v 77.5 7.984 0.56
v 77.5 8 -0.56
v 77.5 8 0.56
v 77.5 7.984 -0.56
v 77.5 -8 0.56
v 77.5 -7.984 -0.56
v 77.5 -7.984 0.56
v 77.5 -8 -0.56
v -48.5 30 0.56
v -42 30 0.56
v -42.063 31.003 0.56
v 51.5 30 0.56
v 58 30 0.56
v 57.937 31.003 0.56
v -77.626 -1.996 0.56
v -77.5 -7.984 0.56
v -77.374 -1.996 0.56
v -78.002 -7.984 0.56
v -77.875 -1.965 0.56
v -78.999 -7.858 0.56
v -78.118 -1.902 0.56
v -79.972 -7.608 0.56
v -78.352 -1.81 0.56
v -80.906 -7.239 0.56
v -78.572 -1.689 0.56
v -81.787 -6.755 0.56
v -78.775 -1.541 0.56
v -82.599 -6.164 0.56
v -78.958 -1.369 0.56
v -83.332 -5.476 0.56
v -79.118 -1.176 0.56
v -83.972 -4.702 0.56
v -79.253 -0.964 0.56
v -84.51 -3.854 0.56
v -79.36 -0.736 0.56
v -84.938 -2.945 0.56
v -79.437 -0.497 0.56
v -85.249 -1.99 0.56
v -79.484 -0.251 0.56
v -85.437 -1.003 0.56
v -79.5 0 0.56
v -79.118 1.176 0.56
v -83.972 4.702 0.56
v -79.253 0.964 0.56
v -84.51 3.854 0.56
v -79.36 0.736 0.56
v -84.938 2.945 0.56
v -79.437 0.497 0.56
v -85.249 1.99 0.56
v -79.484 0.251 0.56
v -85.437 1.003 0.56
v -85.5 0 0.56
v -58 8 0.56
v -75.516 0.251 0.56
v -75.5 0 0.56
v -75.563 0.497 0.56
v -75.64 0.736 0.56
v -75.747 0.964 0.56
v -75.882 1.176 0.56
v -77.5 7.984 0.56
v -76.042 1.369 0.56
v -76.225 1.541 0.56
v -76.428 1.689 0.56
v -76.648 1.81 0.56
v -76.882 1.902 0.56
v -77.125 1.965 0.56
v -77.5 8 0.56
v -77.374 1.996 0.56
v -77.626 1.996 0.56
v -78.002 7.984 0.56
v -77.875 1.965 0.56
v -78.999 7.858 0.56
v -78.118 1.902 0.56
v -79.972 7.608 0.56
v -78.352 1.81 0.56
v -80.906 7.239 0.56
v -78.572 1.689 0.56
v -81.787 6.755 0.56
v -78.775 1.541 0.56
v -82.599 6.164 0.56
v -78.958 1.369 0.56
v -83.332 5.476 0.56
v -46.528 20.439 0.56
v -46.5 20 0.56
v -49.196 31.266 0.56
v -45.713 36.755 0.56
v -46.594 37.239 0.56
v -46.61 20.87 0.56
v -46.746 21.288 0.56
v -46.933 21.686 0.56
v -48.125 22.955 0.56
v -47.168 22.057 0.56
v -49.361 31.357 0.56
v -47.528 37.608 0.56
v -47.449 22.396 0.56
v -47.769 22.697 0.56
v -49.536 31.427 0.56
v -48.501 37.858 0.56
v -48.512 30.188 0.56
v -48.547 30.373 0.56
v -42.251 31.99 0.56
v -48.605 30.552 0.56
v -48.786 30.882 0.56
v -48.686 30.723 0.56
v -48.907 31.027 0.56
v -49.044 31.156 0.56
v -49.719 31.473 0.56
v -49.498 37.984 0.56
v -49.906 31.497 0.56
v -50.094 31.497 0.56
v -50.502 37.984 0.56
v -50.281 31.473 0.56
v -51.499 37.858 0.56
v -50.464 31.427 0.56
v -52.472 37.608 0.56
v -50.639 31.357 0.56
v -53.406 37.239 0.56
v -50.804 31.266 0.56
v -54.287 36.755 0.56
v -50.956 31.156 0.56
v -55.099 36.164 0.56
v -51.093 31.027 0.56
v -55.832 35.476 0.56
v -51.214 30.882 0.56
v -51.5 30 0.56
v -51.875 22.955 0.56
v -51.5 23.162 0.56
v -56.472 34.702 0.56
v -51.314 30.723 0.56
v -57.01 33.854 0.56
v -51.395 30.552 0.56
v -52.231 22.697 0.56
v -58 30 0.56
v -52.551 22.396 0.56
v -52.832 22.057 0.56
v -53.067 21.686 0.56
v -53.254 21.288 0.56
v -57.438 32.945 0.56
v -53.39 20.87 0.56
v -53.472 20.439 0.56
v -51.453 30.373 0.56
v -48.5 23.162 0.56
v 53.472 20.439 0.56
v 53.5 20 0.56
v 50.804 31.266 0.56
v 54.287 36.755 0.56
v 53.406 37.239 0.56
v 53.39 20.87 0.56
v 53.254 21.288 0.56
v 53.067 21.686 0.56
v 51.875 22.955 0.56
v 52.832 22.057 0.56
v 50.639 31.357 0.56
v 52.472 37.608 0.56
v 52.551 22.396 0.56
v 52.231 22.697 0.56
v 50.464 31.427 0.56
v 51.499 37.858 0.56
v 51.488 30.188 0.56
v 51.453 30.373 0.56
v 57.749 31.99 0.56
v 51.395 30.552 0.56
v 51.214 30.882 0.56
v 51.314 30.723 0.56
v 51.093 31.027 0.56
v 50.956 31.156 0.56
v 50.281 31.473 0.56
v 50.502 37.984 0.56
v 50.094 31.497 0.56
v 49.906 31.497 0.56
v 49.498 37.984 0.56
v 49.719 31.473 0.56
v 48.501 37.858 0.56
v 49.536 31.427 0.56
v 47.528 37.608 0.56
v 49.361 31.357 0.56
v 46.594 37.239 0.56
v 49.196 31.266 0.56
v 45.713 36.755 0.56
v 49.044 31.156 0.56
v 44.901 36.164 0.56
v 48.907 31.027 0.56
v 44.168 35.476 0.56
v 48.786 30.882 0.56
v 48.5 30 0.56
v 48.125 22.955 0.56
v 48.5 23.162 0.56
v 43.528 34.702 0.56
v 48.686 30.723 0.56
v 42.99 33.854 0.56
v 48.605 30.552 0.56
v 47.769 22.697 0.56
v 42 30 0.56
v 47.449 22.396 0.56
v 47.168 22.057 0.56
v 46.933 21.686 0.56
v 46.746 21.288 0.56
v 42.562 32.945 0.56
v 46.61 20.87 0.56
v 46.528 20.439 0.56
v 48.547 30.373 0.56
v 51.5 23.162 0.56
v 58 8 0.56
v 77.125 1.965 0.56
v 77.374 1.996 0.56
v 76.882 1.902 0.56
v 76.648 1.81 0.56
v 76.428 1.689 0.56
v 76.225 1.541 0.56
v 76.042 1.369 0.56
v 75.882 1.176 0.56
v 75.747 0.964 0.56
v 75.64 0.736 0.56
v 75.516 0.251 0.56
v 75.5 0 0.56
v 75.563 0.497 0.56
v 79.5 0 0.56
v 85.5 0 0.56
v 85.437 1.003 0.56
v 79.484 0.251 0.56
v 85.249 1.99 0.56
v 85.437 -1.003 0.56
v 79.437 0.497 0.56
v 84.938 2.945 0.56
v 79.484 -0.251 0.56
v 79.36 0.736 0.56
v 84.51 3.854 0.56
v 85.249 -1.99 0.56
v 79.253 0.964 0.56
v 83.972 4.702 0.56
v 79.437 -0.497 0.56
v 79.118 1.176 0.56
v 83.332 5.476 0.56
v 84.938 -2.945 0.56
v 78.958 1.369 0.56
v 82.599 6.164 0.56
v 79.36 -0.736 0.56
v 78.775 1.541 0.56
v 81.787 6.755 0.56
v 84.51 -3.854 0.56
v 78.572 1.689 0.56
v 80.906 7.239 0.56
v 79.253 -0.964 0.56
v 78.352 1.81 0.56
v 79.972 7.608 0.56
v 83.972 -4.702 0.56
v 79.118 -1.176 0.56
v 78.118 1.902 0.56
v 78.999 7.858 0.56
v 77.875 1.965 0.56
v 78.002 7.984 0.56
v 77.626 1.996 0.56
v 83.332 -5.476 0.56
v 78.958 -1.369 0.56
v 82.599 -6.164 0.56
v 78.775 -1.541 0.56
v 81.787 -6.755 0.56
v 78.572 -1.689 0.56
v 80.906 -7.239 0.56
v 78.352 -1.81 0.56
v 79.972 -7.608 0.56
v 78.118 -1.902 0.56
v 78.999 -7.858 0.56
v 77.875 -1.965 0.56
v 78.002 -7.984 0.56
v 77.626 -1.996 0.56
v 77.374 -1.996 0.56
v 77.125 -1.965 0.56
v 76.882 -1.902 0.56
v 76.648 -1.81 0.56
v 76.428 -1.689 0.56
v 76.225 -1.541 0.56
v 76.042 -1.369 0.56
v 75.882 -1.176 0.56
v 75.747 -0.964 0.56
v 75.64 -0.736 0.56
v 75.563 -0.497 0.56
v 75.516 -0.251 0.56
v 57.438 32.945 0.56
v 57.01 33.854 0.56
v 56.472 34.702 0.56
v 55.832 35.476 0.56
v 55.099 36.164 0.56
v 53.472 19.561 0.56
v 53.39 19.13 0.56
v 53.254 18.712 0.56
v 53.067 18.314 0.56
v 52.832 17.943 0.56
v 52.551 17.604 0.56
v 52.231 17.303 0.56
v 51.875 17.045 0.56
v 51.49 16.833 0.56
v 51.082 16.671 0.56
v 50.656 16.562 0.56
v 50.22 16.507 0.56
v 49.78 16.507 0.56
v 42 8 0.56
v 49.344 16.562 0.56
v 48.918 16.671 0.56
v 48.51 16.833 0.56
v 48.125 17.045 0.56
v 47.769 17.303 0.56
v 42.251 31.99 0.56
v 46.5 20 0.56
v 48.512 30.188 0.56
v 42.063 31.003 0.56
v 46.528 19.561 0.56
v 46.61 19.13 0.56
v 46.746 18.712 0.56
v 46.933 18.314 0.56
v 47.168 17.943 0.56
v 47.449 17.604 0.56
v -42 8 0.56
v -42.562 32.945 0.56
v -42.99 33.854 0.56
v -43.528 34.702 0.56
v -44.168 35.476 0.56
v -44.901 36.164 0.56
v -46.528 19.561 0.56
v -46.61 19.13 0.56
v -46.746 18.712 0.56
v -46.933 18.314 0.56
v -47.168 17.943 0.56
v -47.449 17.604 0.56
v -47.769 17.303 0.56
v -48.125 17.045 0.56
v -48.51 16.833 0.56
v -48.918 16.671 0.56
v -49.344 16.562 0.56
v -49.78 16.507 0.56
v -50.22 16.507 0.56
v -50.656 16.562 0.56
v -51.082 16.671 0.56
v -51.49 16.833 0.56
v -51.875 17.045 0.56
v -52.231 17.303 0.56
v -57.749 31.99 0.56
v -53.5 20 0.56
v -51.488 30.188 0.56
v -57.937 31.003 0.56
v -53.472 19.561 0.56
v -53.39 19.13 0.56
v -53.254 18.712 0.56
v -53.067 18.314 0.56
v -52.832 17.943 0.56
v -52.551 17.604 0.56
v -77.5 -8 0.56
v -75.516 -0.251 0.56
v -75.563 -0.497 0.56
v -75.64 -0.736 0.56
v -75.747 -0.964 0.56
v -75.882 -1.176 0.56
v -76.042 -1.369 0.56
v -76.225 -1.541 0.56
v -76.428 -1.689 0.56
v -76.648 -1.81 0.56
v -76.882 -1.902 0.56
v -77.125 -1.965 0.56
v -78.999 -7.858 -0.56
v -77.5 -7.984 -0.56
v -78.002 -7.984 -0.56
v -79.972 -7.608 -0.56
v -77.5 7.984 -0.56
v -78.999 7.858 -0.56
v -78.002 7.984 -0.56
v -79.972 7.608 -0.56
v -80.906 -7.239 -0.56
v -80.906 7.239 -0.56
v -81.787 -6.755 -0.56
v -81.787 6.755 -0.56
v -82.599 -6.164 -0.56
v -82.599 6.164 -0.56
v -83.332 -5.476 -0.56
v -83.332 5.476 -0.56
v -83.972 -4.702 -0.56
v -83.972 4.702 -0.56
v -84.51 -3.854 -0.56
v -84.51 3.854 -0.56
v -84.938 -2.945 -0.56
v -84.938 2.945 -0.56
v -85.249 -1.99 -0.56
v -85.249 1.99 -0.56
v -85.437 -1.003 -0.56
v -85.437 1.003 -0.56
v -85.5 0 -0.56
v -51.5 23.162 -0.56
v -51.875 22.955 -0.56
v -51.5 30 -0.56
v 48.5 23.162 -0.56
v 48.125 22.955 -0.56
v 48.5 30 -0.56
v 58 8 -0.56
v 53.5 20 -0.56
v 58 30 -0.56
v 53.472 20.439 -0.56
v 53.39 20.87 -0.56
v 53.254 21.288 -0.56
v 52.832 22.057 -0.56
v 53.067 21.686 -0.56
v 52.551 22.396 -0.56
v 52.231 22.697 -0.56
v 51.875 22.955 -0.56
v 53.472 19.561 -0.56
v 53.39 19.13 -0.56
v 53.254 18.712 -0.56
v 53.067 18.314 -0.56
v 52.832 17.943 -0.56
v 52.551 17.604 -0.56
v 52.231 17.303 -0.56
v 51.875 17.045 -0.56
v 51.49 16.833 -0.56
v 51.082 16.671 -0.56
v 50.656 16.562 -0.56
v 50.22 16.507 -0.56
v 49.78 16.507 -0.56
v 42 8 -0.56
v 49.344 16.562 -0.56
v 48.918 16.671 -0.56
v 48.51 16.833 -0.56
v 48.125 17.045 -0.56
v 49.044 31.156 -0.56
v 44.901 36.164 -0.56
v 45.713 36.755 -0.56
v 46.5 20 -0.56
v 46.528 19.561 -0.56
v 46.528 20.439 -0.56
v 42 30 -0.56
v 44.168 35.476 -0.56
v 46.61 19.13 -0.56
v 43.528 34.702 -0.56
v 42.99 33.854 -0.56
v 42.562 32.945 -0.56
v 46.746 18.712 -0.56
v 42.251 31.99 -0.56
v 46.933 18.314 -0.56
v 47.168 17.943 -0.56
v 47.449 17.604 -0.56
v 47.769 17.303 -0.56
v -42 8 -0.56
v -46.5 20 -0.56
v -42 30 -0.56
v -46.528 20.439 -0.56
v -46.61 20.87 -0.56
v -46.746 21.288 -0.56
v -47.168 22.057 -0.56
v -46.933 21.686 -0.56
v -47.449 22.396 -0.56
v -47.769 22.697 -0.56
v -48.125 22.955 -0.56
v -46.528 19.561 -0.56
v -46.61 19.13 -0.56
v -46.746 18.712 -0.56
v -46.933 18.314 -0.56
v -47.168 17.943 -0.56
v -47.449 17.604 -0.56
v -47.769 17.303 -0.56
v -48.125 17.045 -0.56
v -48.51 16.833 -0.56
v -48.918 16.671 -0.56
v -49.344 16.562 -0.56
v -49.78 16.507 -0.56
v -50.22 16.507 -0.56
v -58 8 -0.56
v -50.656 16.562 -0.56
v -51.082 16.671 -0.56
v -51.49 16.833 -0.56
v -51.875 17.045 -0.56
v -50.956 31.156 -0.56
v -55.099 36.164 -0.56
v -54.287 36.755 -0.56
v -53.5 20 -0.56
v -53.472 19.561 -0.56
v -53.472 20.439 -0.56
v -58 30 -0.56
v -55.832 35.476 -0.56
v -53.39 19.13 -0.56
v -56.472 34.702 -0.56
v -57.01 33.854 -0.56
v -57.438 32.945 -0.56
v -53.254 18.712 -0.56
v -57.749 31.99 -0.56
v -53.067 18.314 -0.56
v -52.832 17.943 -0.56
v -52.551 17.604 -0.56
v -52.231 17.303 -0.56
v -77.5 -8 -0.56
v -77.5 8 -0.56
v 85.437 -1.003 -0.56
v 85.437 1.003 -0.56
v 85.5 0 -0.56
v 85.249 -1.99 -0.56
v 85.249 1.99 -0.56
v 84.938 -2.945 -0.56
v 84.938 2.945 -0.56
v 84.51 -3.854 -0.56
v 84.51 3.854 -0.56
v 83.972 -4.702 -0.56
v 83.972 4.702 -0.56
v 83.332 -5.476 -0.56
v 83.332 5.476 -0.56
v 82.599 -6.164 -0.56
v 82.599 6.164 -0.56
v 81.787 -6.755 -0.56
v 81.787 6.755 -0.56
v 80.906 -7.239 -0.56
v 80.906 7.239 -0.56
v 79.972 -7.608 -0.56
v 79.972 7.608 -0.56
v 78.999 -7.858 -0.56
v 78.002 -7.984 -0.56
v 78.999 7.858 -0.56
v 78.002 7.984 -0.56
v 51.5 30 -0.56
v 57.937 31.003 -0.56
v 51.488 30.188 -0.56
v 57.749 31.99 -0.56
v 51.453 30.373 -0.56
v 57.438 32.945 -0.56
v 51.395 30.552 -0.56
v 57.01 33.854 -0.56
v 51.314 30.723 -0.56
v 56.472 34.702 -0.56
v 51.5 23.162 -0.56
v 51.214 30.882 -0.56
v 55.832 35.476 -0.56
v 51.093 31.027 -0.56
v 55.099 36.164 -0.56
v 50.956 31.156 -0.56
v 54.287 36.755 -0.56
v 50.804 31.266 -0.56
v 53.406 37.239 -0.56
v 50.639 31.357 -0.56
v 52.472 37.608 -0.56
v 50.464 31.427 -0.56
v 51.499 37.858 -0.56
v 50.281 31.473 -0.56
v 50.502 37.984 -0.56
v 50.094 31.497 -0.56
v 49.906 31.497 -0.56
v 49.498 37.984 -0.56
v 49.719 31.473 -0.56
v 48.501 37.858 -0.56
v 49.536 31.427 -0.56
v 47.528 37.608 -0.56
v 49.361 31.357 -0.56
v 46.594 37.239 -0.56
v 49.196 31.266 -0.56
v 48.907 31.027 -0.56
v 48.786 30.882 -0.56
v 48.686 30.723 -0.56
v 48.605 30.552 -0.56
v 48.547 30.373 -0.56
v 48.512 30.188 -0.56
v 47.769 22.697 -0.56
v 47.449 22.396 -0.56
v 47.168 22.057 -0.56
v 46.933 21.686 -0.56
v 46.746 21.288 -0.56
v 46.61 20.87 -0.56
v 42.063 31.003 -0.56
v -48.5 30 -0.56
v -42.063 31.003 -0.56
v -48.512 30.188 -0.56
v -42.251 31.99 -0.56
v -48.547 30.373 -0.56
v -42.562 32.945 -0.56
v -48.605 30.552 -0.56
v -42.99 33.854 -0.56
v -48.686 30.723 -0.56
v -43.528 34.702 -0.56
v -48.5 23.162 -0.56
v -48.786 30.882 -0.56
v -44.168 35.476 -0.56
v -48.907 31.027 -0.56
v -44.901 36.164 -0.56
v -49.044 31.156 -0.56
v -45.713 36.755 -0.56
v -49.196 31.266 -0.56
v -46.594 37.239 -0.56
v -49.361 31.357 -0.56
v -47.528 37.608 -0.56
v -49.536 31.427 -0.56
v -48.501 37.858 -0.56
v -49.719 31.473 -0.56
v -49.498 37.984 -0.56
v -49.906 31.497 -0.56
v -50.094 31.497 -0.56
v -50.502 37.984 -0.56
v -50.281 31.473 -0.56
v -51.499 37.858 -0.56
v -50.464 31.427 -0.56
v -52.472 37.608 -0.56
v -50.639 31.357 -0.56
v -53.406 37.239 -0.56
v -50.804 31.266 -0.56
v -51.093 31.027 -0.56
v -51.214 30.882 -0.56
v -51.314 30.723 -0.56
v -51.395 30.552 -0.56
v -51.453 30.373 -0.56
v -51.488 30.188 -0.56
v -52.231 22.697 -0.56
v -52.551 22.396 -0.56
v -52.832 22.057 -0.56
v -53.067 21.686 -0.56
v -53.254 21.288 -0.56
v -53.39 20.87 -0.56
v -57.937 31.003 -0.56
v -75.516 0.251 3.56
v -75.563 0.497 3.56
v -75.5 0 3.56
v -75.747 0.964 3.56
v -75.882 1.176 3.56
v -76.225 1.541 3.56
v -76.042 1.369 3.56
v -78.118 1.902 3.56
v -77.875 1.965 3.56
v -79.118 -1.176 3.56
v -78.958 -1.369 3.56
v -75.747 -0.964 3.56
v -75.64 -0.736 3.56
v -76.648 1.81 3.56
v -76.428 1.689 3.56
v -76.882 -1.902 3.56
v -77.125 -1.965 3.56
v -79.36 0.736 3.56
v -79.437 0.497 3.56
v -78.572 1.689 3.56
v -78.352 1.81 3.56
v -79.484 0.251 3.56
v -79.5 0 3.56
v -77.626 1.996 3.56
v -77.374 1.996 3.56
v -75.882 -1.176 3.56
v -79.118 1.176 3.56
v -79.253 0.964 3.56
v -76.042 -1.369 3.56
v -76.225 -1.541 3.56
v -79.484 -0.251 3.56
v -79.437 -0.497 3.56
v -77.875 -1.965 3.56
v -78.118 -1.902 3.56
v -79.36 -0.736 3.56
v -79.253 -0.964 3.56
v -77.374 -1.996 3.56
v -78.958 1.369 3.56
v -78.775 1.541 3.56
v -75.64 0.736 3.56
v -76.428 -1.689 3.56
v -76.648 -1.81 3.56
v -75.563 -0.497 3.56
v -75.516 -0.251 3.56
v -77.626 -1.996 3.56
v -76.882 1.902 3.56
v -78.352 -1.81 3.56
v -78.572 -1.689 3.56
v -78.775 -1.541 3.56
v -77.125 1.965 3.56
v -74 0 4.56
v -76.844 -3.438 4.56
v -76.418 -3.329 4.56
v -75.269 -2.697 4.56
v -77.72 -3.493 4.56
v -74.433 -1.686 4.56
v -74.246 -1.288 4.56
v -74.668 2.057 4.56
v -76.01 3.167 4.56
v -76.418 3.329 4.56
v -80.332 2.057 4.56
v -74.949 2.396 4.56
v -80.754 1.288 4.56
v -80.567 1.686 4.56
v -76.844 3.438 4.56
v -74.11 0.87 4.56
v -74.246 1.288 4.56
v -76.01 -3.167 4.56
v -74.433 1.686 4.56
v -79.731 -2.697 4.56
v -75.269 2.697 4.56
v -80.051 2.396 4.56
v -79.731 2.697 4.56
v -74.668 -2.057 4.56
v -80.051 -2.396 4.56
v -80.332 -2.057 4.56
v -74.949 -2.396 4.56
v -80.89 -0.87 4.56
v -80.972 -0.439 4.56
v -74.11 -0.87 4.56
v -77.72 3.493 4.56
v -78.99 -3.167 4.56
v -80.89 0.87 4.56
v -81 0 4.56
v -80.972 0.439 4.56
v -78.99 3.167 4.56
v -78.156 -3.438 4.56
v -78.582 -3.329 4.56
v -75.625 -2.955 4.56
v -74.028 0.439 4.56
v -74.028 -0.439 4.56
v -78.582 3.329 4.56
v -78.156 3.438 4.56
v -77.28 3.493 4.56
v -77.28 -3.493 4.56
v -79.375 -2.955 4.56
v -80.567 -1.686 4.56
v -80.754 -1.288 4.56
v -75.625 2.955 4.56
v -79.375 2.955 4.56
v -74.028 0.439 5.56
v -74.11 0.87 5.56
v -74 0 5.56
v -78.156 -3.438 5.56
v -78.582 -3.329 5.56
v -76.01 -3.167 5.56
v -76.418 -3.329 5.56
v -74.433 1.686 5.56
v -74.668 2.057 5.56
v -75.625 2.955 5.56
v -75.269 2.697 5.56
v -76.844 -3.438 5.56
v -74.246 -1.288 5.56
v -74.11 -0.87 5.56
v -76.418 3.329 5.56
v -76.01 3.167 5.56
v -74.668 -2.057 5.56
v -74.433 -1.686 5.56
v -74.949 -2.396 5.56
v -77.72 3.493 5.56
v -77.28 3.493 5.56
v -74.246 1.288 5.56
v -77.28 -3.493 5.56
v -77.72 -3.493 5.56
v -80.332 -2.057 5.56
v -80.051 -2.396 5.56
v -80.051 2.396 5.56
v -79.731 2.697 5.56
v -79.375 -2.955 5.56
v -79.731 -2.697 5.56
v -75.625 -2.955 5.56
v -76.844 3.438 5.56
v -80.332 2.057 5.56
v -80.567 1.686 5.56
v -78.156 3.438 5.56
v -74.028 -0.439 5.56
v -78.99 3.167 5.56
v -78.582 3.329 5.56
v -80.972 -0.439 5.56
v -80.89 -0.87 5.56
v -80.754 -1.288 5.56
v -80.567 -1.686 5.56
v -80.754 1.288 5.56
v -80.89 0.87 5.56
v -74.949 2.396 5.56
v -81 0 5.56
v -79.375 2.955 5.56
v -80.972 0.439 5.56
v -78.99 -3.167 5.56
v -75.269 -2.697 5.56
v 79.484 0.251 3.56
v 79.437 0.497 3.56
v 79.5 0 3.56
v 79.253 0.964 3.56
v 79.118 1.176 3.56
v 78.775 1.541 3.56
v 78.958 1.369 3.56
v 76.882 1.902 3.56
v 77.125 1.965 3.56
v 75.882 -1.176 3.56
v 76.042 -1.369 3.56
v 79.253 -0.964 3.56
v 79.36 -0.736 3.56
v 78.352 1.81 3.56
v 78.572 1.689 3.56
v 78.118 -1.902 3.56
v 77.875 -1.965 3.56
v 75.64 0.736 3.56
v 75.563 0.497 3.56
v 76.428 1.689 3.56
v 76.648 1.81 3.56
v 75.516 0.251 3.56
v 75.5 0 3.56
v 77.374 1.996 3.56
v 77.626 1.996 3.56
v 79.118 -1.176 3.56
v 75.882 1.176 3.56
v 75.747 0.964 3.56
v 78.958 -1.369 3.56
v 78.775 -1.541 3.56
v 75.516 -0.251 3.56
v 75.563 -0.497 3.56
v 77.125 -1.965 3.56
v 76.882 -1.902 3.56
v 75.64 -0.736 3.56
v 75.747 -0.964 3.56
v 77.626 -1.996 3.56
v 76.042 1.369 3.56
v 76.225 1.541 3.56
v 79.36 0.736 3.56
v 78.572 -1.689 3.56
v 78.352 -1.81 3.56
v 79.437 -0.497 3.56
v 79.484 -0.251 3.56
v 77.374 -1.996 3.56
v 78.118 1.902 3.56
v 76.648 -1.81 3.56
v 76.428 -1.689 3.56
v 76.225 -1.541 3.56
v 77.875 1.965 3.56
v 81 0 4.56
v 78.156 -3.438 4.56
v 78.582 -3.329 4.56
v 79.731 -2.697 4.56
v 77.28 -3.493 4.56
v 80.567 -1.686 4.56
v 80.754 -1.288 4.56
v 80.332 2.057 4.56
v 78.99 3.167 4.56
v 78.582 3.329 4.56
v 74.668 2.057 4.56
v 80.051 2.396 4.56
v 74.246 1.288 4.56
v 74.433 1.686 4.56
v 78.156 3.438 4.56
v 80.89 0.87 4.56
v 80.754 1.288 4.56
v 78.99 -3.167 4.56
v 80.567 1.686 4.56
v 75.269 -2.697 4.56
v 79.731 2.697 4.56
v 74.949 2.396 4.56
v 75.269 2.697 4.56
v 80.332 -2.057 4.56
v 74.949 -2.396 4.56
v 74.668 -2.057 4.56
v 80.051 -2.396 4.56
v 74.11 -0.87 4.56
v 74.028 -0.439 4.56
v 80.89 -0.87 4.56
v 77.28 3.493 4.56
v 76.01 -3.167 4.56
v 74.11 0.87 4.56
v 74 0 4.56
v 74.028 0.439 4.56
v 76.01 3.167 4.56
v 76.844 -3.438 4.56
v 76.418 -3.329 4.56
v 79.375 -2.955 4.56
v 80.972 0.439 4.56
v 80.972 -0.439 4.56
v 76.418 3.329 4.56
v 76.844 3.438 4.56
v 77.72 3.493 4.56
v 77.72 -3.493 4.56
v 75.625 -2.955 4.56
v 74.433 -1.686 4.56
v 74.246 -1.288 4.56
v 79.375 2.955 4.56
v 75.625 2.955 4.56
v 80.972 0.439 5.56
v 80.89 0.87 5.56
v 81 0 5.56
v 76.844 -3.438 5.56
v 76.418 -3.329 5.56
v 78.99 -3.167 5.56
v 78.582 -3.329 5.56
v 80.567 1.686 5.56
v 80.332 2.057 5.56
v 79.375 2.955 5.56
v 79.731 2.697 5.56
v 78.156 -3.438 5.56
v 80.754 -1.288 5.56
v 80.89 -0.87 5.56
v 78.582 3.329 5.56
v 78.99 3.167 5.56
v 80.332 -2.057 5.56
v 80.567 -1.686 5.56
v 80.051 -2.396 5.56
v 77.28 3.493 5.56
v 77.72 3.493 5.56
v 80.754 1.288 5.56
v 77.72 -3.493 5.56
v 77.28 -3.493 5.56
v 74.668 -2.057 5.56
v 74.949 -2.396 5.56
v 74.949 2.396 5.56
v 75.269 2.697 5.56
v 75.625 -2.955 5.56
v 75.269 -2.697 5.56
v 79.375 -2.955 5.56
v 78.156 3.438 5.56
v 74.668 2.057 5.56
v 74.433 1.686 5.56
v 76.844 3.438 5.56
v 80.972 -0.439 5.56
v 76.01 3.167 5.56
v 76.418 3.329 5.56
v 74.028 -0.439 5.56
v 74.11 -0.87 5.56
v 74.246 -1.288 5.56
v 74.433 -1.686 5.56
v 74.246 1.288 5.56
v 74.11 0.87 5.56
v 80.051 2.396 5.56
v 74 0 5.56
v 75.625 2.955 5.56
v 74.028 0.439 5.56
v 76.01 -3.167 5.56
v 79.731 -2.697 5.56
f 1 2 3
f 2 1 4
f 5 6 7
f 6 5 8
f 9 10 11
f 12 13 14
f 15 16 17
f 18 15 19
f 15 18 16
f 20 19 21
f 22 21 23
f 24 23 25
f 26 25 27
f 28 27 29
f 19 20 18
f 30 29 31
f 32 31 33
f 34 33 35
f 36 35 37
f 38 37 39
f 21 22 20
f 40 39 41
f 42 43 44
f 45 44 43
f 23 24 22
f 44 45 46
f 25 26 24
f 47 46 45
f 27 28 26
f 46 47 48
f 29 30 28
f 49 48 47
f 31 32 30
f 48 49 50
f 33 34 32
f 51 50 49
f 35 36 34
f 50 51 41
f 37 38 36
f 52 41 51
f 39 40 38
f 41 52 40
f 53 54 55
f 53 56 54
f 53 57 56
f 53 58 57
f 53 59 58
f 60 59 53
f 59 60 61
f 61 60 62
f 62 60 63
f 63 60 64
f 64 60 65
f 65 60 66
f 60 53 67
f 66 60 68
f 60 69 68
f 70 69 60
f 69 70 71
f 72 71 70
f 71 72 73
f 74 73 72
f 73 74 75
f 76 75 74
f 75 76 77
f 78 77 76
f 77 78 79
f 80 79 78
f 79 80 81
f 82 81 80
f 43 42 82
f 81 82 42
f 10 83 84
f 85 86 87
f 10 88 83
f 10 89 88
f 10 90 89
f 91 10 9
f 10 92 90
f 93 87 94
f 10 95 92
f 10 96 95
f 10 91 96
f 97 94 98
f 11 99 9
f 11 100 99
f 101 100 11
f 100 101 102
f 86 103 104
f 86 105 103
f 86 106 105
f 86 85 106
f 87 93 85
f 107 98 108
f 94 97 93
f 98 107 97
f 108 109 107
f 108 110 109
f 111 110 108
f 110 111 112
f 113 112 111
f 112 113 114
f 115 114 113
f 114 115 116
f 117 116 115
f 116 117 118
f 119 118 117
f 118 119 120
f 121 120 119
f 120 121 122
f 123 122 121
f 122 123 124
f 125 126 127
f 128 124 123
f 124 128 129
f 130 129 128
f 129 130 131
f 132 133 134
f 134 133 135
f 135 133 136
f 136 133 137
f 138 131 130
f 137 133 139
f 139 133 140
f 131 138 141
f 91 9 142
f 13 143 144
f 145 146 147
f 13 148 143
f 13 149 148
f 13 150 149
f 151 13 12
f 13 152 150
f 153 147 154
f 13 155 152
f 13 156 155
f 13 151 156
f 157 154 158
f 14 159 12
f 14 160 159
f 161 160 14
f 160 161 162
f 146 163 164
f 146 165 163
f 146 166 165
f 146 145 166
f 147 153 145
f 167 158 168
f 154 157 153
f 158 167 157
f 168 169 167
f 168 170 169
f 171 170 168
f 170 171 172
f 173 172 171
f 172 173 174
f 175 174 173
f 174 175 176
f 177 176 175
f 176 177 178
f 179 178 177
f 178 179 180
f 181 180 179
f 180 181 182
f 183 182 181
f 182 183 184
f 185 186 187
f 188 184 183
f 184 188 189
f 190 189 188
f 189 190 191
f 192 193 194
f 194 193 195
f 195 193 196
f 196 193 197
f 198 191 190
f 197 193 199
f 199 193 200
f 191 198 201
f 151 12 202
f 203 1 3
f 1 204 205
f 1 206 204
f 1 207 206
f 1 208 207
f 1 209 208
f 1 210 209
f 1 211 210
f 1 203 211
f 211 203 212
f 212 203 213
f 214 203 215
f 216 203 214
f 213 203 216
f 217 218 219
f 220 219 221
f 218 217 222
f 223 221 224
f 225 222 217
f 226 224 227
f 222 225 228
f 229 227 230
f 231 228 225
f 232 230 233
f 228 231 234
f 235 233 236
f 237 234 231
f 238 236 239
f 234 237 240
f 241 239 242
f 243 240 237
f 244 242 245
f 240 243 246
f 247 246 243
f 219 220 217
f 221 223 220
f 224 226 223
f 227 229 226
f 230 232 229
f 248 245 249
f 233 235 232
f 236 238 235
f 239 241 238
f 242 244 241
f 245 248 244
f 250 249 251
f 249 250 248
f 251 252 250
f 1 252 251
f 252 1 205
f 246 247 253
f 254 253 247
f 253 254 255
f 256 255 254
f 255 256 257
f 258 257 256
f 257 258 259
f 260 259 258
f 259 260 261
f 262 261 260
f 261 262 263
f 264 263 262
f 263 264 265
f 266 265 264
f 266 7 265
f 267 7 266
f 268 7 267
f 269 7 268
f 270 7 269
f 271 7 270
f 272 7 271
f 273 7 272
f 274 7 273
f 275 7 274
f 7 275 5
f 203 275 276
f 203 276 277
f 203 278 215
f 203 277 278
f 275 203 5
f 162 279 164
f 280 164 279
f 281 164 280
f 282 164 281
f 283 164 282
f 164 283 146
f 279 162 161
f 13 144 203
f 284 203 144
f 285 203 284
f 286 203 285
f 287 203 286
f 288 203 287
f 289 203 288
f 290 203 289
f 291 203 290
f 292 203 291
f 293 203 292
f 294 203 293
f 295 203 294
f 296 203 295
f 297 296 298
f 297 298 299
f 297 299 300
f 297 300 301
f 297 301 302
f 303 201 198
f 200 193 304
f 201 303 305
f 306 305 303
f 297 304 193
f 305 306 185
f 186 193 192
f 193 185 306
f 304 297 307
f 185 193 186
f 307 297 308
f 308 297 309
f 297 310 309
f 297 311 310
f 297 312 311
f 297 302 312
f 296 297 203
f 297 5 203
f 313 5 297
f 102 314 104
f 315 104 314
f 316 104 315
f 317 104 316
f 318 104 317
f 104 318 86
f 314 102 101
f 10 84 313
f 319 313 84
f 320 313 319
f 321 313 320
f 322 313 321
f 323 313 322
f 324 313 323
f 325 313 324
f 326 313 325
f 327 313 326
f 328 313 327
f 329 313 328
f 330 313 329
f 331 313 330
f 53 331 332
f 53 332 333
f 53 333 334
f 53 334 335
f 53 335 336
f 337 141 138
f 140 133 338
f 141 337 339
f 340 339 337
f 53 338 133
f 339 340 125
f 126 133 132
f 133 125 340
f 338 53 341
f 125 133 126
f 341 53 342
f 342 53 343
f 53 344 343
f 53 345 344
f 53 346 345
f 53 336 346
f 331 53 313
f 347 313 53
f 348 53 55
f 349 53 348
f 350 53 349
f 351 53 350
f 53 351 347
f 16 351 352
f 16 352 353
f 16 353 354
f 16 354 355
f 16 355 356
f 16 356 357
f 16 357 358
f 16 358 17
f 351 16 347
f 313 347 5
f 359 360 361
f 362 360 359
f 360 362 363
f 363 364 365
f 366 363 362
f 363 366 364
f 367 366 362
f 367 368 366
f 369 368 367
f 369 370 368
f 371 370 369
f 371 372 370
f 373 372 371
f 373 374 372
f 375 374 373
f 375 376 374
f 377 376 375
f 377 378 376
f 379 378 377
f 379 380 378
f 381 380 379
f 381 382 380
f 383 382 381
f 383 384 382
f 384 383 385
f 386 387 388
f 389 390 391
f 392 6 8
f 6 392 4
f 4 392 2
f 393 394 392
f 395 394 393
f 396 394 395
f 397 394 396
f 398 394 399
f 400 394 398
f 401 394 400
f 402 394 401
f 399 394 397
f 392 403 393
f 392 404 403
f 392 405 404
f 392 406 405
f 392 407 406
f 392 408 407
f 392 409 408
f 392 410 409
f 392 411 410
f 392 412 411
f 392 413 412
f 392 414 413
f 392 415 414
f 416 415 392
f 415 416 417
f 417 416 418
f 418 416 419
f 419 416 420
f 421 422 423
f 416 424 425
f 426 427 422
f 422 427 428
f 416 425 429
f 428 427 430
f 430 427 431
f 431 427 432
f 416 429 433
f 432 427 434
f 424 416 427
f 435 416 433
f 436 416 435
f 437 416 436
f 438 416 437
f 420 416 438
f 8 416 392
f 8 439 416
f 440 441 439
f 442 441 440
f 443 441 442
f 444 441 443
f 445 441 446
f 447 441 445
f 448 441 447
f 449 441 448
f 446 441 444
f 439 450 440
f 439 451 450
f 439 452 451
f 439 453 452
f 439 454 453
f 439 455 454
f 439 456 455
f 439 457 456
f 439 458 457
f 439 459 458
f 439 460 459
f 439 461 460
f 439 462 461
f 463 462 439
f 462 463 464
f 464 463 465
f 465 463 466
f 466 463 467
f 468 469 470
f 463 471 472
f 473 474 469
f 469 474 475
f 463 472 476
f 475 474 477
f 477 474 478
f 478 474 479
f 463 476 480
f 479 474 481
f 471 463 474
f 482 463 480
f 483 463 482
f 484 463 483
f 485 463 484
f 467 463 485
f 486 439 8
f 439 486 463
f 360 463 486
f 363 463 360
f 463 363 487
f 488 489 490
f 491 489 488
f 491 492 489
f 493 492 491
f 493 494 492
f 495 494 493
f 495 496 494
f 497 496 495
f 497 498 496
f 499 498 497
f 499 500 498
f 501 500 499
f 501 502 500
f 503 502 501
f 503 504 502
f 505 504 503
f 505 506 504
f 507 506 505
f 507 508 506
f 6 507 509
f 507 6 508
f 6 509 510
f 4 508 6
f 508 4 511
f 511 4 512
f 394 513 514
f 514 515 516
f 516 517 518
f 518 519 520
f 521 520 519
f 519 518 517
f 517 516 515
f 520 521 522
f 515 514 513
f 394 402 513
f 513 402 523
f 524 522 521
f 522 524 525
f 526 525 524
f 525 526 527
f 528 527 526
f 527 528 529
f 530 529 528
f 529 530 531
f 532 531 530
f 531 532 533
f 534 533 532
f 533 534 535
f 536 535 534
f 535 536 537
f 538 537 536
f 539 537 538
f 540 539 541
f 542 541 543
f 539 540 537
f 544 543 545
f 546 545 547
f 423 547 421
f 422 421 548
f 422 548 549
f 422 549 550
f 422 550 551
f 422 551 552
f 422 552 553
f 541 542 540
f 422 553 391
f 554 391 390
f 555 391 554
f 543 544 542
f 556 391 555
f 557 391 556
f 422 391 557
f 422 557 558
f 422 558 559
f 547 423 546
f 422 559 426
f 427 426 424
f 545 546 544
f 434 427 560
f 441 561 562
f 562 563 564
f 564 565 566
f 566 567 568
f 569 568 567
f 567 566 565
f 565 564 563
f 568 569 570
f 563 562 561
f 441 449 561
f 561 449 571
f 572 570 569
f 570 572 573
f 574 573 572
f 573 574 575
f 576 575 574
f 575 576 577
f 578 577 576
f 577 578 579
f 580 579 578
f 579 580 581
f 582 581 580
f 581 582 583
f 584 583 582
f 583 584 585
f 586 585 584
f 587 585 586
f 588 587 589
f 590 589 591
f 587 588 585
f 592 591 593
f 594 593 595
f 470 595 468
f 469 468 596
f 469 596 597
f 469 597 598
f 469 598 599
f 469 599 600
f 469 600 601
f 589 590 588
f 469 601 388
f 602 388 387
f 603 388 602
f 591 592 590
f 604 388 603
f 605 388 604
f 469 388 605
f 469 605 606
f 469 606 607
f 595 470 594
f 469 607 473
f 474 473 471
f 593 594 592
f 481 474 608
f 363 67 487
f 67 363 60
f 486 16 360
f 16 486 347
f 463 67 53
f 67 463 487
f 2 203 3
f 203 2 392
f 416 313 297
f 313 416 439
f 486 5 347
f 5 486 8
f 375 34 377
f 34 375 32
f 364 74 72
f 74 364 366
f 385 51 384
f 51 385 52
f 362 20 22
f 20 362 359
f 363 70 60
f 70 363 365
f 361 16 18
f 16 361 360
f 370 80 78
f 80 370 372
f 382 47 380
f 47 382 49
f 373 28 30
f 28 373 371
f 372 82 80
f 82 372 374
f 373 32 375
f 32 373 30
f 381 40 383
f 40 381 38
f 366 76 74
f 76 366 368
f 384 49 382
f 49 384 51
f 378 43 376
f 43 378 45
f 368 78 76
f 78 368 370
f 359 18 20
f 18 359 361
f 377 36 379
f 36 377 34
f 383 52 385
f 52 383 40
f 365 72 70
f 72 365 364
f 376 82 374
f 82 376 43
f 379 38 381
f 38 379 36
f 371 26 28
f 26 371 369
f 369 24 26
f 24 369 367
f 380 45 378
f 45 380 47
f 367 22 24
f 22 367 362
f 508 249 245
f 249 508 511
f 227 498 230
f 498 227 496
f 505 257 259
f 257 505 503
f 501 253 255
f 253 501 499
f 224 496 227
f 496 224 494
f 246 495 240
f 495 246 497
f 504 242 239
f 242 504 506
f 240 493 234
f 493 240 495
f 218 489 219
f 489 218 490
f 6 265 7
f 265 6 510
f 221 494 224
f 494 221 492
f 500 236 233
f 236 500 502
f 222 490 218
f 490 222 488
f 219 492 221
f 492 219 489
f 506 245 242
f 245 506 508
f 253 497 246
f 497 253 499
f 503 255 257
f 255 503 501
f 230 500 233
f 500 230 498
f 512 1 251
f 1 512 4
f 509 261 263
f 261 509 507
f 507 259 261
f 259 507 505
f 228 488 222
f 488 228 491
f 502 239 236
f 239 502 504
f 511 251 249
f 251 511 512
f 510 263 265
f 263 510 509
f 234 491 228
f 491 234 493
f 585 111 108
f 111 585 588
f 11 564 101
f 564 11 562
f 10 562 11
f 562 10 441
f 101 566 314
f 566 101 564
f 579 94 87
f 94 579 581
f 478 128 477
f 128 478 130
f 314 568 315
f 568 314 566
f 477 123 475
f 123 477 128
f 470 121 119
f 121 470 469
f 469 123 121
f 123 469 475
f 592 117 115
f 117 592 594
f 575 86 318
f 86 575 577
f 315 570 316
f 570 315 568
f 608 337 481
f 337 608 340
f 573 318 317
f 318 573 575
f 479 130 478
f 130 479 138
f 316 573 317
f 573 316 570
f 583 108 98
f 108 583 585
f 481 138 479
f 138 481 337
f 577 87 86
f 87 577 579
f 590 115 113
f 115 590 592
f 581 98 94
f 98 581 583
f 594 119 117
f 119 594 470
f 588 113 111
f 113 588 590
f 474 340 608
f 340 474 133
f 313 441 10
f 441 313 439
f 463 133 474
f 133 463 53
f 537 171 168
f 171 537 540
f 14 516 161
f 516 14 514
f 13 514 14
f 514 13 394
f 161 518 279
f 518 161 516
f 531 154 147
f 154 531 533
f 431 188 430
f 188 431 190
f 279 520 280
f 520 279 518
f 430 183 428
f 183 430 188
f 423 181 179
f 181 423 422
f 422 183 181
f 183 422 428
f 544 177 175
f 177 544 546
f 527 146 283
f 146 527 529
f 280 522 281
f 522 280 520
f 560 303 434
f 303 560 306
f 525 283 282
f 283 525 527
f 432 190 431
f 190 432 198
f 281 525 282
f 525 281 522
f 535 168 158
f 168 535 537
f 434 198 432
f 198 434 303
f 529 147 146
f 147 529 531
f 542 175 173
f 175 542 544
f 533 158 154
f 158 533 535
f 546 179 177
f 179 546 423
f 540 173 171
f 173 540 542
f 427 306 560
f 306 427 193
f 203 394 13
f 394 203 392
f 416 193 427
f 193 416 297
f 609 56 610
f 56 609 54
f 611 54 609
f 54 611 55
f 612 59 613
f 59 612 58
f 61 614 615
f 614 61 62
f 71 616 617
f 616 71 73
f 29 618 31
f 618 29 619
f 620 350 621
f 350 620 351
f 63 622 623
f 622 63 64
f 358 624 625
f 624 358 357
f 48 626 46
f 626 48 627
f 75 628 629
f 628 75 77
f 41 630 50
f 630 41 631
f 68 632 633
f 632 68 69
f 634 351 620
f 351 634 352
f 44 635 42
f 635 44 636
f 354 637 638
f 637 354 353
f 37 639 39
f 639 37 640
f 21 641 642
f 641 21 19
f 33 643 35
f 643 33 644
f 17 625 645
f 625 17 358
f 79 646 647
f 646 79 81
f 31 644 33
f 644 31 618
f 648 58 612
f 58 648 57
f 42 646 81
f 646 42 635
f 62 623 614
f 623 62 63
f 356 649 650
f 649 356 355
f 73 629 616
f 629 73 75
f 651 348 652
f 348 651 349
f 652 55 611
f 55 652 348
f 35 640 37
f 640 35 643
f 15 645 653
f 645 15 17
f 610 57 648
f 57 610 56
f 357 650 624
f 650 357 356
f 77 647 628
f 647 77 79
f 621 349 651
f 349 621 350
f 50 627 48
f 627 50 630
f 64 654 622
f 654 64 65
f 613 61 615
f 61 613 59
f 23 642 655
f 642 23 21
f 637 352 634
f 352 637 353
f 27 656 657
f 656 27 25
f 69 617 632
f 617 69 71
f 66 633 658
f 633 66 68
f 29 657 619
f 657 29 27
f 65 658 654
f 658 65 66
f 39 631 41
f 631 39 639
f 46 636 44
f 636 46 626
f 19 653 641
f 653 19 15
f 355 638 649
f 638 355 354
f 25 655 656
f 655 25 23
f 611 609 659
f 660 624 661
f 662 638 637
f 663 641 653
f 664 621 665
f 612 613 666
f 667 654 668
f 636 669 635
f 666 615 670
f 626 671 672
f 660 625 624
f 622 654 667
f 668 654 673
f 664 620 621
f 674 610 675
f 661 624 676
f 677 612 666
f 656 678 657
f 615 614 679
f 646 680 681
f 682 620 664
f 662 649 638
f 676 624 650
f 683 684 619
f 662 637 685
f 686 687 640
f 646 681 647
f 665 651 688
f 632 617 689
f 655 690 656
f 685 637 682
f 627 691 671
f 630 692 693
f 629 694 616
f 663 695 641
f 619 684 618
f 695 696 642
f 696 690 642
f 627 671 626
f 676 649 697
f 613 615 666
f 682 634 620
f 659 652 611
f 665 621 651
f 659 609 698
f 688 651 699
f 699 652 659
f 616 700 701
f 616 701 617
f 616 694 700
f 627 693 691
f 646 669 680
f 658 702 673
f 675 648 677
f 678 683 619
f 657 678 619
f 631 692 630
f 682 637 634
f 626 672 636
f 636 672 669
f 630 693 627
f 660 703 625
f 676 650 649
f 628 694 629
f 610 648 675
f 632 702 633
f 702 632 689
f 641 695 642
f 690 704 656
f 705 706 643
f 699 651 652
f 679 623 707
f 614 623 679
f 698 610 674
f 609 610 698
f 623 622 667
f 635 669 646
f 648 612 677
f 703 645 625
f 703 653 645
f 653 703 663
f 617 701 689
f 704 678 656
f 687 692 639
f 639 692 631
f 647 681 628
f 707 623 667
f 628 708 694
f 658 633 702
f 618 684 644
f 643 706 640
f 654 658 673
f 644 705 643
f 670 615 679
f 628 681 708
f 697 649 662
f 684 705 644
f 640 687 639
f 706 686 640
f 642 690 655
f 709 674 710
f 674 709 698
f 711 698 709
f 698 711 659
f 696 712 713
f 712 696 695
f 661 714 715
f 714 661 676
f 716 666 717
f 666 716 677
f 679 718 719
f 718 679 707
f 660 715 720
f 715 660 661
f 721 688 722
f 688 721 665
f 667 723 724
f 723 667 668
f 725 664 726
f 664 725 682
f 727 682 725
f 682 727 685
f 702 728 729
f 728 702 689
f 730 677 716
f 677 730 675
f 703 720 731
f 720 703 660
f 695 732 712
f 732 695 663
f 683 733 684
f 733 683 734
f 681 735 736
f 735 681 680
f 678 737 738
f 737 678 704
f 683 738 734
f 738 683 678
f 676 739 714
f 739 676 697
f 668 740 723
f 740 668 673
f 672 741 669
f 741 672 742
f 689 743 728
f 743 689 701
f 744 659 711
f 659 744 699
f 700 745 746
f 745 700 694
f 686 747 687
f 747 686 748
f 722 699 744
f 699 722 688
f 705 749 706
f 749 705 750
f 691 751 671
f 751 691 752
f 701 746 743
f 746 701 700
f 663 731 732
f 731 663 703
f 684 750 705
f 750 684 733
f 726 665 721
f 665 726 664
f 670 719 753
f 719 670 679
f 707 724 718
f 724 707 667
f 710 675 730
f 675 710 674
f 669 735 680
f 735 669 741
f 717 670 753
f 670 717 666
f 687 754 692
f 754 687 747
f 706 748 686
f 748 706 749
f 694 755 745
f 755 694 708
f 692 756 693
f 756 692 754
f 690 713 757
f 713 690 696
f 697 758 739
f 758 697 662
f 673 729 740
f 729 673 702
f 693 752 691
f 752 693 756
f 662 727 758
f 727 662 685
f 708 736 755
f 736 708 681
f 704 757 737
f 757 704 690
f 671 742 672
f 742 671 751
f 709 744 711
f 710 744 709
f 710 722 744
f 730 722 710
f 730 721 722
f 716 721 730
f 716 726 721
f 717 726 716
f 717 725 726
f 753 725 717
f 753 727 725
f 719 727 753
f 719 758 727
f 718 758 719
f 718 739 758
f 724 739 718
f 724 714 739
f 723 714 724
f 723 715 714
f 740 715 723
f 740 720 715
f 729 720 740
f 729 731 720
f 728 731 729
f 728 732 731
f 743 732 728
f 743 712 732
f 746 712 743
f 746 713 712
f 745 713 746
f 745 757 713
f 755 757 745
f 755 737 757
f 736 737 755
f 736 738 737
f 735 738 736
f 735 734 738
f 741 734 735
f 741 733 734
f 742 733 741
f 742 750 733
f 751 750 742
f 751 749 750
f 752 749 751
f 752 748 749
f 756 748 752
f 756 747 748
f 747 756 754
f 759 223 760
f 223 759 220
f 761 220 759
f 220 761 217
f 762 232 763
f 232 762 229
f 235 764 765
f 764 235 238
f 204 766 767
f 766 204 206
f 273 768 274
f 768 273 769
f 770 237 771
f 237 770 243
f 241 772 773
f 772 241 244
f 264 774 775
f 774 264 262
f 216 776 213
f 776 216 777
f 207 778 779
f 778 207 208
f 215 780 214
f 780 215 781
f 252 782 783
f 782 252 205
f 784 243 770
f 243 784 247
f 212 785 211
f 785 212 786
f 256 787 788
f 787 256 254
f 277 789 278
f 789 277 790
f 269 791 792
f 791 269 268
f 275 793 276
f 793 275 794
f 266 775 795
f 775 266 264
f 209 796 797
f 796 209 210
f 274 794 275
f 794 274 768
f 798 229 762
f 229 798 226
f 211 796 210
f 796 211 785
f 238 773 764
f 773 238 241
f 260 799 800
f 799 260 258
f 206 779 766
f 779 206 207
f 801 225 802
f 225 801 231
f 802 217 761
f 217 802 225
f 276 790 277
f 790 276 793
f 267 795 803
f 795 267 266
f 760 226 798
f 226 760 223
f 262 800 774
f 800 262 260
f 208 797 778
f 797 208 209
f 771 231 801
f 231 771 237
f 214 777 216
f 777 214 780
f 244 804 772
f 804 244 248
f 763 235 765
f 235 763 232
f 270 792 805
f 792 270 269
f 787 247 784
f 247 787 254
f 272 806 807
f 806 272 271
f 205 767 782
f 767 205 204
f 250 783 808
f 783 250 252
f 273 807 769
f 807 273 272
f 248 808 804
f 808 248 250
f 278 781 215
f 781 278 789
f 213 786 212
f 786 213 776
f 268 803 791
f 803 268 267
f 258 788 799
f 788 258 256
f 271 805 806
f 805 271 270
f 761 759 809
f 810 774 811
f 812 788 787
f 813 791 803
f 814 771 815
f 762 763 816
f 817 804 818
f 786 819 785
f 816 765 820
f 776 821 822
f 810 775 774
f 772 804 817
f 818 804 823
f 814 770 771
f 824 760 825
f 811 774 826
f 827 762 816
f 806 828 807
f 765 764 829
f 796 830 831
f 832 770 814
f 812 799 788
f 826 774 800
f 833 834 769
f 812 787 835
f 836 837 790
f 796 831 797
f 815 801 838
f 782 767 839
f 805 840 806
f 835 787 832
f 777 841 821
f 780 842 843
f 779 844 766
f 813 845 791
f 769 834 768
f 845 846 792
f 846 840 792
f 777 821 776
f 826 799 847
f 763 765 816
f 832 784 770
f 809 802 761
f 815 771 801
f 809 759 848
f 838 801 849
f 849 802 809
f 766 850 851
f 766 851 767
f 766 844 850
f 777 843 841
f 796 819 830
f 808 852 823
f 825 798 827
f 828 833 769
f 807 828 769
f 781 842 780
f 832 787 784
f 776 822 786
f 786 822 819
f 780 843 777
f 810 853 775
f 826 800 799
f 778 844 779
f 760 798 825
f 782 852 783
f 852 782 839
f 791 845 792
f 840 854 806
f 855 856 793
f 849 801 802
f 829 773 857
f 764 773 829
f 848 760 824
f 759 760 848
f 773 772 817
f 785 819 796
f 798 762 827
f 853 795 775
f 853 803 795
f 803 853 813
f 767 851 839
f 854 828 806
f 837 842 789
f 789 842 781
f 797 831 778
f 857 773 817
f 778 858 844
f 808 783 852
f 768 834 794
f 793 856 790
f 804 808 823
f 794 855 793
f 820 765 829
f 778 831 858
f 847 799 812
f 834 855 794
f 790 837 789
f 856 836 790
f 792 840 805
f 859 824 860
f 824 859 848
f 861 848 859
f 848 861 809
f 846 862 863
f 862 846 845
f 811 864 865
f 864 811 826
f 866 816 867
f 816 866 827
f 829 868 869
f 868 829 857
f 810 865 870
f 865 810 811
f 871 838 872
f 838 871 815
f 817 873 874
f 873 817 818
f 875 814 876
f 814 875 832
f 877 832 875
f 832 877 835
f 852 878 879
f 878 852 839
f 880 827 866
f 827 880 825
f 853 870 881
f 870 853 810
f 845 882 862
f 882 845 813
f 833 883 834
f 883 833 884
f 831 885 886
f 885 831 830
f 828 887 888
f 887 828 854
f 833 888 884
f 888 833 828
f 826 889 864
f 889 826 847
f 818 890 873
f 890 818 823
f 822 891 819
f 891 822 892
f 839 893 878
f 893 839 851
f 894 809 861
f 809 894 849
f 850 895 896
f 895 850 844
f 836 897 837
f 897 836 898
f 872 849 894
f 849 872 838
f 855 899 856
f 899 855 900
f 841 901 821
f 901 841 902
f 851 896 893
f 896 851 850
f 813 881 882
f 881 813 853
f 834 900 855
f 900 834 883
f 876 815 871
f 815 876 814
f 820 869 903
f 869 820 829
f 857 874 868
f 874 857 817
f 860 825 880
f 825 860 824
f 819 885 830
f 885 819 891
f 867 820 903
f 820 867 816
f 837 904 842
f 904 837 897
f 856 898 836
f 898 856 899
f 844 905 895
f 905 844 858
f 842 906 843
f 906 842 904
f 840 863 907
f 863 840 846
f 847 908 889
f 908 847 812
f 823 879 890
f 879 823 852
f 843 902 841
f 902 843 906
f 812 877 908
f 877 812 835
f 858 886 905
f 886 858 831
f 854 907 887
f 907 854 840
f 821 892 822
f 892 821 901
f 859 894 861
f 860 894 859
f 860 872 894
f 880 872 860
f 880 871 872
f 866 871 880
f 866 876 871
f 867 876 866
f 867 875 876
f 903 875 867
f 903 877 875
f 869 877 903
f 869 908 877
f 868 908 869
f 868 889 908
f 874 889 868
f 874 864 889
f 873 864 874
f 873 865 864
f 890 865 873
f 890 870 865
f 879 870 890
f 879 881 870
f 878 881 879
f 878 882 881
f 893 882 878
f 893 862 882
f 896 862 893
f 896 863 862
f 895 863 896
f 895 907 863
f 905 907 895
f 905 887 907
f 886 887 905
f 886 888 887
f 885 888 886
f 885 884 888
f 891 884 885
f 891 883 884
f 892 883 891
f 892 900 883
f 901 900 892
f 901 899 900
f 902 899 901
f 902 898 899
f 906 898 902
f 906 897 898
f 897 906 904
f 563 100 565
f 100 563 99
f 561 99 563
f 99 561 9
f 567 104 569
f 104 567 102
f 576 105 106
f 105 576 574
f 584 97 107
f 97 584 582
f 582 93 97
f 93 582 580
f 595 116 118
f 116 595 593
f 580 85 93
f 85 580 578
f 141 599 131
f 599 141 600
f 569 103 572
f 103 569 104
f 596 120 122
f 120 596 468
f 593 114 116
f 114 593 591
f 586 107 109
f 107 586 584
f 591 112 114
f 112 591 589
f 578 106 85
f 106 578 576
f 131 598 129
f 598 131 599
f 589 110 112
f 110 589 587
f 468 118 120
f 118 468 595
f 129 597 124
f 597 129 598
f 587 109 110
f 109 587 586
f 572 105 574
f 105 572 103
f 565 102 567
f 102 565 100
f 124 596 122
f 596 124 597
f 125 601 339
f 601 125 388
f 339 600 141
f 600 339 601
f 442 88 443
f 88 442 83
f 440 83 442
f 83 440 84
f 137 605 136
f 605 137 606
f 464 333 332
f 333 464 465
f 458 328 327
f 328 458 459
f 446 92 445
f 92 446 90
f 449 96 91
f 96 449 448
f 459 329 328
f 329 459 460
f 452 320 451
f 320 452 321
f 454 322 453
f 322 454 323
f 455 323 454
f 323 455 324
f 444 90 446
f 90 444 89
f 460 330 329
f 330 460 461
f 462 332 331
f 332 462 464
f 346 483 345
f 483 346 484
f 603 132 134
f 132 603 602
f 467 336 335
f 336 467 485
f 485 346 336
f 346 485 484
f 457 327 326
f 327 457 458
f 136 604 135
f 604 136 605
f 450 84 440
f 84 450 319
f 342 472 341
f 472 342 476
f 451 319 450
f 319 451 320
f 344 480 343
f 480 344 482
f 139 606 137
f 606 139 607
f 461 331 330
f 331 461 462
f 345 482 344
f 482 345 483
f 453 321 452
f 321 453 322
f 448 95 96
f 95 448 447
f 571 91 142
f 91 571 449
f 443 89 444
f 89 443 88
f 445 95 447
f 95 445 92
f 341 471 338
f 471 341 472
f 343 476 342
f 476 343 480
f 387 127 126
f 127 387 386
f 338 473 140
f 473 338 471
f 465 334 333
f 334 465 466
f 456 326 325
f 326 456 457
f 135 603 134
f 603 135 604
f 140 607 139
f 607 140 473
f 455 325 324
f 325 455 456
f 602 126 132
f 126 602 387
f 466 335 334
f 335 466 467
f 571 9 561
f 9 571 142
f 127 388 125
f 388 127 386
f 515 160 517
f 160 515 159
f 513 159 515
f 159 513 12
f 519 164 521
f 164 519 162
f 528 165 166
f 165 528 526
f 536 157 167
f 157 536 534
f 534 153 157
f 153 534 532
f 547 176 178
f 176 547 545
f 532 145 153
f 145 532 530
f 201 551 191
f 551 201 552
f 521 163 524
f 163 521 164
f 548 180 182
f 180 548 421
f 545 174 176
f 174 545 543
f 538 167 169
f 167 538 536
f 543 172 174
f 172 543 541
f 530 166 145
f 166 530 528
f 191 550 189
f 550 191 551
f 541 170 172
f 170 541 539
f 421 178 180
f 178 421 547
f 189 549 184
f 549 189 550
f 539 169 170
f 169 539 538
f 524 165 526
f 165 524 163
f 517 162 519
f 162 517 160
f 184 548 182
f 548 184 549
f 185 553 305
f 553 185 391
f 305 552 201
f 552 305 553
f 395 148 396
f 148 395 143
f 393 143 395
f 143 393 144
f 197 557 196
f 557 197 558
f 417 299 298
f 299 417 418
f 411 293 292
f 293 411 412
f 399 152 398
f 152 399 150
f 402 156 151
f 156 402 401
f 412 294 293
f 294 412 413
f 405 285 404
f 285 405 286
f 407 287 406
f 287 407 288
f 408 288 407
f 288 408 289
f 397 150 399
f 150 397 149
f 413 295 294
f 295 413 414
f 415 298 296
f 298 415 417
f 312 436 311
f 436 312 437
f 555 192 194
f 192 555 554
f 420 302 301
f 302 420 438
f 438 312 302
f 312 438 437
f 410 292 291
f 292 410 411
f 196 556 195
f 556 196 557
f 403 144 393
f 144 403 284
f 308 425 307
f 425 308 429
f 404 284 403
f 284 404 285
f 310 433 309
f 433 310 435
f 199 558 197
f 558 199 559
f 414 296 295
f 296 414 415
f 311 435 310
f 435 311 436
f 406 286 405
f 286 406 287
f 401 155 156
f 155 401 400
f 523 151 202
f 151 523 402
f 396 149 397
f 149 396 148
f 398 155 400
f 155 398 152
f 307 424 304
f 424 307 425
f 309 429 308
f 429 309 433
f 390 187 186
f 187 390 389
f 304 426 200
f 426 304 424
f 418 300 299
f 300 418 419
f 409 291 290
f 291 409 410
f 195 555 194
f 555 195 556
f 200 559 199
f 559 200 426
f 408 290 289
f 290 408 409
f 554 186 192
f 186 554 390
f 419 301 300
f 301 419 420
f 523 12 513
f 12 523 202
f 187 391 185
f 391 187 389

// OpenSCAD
Overlap=0.05;
$fn=50;

design=1;

brackethickness=0.28*4;

bracketWidth=16;

wallBracketHoleDistance=100;
wallBracketGrooveLength=10;
wallBracketHeight=30;
wallLargeHoleDiameter=7;
wallSmallHoleDiameter=3;

deviceBracketHoleDistance=155;
deviceBracketPegBaseDiameter=4;
deviceBracketPegHeadDiameter=7;
deviceBracketPegLength=3;
deviceBracketPegHeadLength=1;
deviceBracketPegConeLength=1;

bracket();

module bracket(){
    addHoles(){
        bracketBase();
    }
}

module bracketBase(bracketLength=wallBracketHoleDistance<deviceBracketHoleDistance?deviceBracketHoleDistance:wallBracketHoleDistance){
    translate([0,design==1?0:wallBracketHeight,0])
    union(){
        cube([bracketLength,bracketWidth,brackethickness],center=true);

        translate([-bracketLength/2,0,0])
        cylinder(d=bracketWidth, h=brackethickness, center=true);

        translate([bracketLength/2,0,0])
        cylinder(d=bracketWidth, h=brackethickness, center=true);
    }

    translate([-wallBracketHoleDistance/2,wallBracketHeight-wallBracketGrooveLength,0])
    cylinder(d=wallLargeHoleDiameter+8, h=brackethickness, center=true);

    translate([wallBracketHoleDistance/2,wallBracketHeight-wallBracketGrooveLength,0])
    cylinder(d=wallLargeHoleDiameter+8, h=brackethickness, center=true);

    translate([design==1?-wallBracketHoleDistance/2:-deviceBracketHoleDistance/2,wallBracketHeight,0])
    wallBracket();
    translate([design==1?wallBracketHoleDistance/2:deviceBracketHoleDistance/2,wallBracketHeight,0])
    wallBracket();

    translate([-deviceBracketHoleDistance/2,0,0])
    deviceHolderPeg();

    translate([deviceBracketHoleDistance/2,0,0])
    deviceHolderPeg();
}

module wallBracket(){
    cylinder(d=bracketWidth, h=brackethickness, center=true);
    translate([0,-wallBracketHeight/2,0])
    cube([bracketWidth,wallBracketHeight,brackethickness],center=true);
}

module deviceHolderPeg(){
    cylinder(d=bracketWidth, h=brackethickness, center=true);

    color("orange")
    {
        translate([0,0,deviceBracketPegLength/2+brackethickness/2])
        cylinder(d=deviceBracketPegBaseDiameter, h=deviceBracketPegLength, center=true);

        translate([0,0,deviceBracketPegLength+brackethickness/2+deviceBracketPegConeLength/2])
        cylinder(d1=deviceBracketPegBaseDiameter,d2=deviceBracketPegHeadDiameter, h=deviceBracketPegConeLength, center=true);

        translate([0,0,deviceBracketPegLength+brackethickness/2+deviceBracketPegConeLength+deviceBracketPegHeadLength/2])
        cylinder(d=deviceBracketPegHeadDiameter, h=deviceBracketPegHeadLength, center=true);
    }
}

module addHoles(){
    difference(){
        children();
        union(){
            translate([-wallBracketHoleDistance/2,wallBracketHeight,0])
            wallHole();
            translate([wallBracketHoleDistance/2,wallBracketHeight,0])
            wallHole();
        }
    }
}

module wallHole(){
    cylinder(d=wallSmallHoleDiameter, h=brackethickness*2, center=true);

    translate([0,-wallBracketGrooveLength,0])
    cylinder(d=wallLargeHoleDiameter, h=brackethickness*2, center=true);

    translate([0,-wallBracketGrooveLength/2,0])
    cube([wallSmallHoleDiameter,wallBracketGrooveLength,brackethickness*2],center=true);
}
